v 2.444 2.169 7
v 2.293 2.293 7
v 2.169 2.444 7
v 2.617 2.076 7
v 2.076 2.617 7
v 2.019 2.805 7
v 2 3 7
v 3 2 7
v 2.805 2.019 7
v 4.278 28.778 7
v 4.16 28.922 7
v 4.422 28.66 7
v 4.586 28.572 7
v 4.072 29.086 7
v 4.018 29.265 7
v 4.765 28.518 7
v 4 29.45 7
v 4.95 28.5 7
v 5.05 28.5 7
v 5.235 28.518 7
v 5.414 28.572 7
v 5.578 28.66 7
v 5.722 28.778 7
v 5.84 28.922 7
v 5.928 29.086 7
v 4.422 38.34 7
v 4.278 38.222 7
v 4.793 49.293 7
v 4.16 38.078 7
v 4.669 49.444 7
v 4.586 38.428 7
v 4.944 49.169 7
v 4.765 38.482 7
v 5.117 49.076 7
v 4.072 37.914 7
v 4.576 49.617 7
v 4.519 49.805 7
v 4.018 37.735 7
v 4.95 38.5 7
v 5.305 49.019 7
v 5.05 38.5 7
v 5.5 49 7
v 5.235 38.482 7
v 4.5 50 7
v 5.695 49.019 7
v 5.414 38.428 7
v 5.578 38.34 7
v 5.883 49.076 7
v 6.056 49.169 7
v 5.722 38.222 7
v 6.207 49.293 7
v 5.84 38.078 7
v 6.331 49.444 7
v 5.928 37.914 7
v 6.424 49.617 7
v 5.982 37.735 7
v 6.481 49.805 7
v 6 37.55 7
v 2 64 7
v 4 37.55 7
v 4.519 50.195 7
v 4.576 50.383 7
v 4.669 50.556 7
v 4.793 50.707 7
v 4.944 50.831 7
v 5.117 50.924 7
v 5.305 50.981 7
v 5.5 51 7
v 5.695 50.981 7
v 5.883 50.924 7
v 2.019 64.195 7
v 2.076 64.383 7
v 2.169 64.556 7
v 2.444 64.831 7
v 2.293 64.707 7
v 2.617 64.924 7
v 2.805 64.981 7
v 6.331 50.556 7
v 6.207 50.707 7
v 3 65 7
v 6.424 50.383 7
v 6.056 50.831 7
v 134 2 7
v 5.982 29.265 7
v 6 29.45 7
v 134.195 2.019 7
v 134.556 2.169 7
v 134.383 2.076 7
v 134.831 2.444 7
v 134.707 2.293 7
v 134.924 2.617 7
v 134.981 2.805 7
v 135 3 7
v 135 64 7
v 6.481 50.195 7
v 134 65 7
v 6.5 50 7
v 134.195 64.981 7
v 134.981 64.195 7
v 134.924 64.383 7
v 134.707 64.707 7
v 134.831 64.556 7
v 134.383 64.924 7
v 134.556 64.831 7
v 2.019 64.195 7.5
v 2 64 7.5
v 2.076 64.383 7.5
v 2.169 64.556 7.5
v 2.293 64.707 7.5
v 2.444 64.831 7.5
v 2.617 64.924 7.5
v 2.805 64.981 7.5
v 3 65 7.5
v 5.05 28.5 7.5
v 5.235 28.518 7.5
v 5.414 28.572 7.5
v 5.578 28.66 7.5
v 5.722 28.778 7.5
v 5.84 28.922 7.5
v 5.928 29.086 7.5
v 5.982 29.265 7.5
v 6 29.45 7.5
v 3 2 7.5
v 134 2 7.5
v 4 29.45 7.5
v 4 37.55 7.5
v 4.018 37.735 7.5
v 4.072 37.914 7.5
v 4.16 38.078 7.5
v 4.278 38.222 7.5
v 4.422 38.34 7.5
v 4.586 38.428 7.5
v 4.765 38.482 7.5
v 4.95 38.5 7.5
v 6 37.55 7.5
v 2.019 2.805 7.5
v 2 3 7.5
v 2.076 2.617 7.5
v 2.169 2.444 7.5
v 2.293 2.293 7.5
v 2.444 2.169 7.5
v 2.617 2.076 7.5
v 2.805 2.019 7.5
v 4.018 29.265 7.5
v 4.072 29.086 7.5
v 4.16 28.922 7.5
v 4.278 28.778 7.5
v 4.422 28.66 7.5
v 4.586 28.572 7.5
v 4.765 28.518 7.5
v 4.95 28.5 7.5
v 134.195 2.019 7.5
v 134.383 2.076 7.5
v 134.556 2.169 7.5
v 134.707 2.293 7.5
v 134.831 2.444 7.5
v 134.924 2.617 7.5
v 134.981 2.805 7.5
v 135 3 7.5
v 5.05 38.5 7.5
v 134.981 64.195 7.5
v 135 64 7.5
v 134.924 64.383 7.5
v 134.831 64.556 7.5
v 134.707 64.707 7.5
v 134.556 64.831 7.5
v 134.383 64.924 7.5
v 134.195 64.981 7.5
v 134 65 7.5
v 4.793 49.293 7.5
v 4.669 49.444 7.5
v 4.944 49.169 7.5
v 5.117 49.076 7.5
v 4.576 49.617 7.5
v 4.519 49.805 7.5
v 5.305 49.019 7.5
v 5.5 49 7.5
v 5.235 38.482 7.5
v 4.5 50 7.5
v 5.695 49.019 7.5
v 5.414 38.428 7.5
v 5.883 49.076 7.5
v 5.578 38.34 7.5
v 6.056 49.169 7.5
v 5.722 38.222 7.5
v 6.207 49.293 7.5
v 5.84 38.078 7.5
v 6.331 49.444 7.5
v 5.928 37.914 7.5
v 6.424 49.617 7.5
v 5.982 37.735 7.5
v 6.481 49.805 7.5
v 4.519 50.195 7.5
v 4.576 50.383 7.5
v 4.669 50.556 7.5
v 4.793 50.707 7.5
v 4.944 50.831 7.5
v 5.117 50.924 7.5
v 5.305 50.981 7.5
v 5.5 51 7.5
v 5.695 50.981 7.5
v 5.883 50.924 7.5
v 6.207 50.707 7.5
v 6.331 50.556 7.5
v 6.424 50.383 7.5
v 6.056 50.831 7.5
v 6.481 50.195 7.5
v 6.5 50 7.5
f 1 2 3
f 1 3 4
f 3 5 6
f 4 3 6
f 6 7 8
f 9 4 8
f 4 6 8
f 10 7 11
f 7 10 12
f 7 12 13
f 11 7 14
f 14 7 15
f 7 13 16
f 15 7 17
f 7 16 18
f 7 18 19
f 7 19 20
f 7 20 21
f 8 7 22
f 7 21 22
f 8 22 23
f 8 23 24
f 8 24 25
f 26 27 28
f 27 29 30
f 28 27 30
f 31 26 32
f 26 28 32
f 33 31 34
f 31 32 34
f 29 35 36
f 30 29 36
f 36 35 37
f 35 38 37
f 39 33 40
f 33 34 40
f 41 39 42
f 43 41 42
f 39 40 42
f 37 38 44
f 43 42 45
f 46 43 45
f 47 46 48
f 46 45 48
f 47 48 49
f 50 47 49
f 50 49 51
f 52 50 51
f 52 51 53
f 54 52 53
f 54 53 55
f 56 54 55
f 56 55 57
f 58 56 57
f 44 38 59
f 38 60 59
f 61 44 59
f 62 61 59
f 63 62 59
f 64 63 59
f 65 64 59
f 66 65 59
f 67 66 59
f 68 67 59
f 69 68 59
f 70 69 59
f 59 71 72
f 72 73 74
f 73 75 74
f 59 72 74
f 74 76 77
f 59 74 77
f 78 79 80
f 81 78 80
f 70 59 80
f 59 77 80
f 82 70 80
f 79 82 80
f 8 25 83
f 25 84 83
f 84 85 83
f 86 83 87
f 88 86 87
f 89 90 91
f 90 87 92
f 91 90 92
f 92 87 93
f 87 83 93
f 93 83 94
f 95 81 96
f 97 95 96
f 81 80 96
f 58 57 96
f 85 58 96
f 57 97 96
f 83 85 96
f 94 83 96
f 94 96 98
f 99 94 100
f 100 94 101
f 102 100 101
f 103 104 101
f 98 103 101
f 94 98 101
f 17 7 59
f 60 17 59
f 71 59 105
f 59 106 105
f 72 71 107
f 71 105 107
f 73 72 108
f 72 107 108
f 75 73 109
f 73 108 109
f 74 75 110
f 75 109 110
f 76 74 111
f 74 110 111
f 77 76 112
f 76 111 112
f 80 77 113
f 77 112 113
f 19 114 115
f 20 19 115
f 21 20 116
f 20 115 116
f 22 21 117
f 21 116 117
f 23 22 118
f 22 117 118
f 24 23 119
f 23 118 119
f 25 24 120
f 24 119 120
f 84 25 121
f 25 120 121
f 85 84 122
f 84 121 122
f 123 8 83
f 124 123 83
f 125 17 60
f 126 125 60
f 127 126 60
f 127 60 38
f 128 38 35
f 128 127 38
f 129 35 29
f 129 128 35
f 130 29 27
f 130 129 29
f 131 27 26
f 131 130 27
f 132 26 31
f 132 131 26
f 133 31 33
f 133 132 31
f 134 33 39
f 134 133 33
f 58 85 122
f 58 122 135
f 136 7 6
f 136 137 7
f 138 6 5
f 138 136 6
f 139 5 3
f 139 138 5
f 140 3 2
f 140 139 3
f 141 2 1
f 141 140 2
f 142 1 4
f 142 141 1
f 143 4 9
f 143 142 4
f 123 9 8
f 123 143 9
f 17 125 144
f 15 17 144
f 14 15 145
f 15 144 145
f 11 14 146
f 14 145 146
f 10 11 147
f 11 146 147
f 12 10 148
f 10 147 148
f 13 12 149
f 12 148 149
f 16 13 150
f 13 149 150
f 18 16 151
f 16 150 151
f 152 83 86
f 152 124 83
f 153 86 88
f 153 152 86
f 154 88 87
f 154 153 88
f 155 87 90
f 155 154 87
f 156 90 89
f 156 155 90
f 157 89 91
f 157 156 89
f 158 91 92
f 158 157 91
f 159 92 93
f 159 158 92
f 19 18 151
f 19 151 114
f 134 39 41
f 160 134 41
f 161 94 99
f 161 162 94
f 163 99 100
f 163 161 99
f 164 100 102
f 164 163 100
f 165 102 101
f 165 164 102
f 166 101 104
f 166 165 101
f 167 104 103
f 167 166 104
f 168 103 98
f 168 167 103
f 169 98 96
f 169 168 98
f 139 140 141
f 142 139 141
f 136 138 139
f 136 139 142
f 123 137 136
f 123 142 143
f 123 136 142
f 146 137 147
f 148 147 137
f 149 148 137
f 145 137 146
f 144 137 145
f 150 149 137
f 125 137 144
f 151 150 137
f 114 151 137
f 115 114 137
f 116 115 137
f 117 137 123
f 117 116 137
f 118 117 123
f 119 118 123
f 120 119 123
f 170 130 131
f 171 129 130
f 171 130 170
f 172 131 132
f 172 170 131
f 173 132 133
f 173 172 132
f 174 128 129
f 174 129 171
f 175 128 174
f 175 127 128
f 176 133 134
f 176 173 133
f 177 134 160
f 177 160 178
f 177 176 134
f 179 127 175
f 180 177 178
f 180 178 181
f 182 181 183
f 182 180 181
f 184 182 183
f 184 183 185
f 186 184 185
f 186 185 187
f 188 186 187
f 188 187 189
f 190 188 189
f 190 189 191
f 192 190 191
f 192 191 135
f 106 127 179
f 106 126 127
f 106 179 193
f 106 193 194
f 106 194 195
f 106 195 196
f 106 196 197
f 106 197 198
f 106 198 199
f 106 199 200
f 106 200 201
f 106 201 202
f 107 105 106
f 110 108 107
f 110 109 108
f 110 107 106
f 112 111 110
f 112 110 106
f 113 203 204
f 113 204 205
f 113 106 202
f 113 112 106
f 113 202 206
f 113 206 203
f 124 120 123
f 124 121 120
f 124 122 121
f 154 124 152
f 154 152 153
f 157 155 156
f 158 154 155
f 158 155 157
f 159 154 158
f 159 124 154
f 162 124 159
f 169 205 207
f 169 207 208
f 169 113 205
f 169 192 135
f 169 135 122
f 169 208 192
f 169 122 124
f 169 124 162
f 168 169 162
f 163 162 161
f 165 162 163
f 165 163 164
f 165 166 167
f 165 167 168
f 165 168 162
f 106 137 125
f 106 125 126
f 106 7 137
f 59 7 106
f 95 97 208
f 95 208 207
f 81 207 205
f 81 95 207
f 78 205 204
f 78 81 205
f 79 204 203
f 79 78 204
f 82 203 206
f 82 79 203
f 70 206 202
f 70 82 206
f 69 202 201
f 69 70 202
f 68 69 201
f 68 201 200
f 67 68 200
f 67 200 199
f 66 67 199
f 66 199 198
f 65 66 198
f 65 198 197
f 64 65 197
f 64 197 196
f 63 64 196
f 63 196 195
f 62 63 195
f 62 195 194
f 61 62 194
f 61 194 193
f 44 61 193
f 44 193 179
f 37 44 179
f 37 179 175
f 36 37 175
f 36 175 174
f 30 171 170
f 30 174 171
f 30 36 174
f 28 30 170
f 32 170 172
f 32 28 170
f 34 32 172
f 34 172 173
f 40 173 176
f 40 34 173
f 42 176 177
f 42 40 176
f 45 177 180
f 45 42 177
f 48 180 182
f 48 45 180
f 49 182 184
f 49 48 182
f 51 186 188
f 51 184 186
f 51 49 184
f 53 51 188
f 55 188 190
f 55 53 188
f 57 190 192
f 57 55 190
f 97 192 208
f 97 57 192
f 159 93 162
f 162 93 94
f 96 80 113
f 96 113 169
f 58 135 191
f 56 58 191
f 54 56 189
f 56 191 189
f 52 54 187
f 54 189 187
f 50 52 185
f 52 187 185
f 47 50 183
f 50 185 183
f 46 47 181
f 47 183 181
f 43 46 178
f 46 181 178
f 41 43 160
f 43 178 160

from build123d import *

# Parameters (mm, degrees)
CYLINDER010_R     = 1
CYLINDER010_DEPTH = 10
BOX016_W          = 2
BOX016_H          = 10
BOX016_DEPTH      = 10
FILLET008_R       = 0.95
BOX004_W          = 133
BOX004_H          = 63
BOX004_DEPTH      = 0.5
FILLET005_R       = 1


with BuildPart() as cilindro010:
    # Cylinder010 → Cylinder010 (new body)
    with BuildSketch(Plane(origin=(5.5, 50, 0), x_dir=(1, 0, 0), z_dir=(0, 0, 1))):
        Circle(CYLINDER010_R)
    extrude(amount=CYLINDER010_DEPTH)


with BuildPart() as fillet008:
    # Box016 → Box016 (new body)
    with BuildSketch(Plane(origin=(4, 28.5, 0), x_dir=(1, 0, 0), z_dir=(0, 0, 1))):
        with Locations((1, 5)):
            Rectangle(BOX016_W, BOX016_H)
    extrude(amount=BOX016_DEPTH)

    # Fillet008
    fillet008_edges = [fillet008.edges().sort_by_distance(p)[0] for p in [
        (4, 28.5, 5),
        (4, 38.5, 5),
        (6, 28.5, 5),
        (6, 38.5, 5),
    ]]
    fillet(fillet008_edges, radius=FILLET008_R)


with BuildPart() as cut016:
    # Box004 → Box004 (new body)
    with BuildSketch(Plane(origin=(2, 2, 5.5), x_dir=(1, 0, 0), z_dir=(0, 0, 1))):
        with Locations((66.5, 31.5)):
            Rectangle(BOX004_W, BOX004_H)
    extrude(amount=BOX004_DEPTH)

    # Fillet005
    fillet005_edges = [cut016.edges().sort_by_distance(p)[0] for p in [
        (2, 2, 5.75),
        (2, 65, 5.75),
        (135, 2, 5.75),
        (135, 65, 5.75),
    ]]
    fillet(fillet005_edges, radius=FILLET005_R)


with BuildPart() as cut016_1:
    # Fillet005 placement: moved
    add(cut016.part.moved(Location((0, 0, 1.5))))

    # Cut014: cut Fillet008
    add(fillet008.part, mode=Mode.SUBTRACT)

    # Cut016: cut Cilindro010
    add(cilindro010.part, mode=Mode.SUBTRACT)


solid = cut016_1.part
